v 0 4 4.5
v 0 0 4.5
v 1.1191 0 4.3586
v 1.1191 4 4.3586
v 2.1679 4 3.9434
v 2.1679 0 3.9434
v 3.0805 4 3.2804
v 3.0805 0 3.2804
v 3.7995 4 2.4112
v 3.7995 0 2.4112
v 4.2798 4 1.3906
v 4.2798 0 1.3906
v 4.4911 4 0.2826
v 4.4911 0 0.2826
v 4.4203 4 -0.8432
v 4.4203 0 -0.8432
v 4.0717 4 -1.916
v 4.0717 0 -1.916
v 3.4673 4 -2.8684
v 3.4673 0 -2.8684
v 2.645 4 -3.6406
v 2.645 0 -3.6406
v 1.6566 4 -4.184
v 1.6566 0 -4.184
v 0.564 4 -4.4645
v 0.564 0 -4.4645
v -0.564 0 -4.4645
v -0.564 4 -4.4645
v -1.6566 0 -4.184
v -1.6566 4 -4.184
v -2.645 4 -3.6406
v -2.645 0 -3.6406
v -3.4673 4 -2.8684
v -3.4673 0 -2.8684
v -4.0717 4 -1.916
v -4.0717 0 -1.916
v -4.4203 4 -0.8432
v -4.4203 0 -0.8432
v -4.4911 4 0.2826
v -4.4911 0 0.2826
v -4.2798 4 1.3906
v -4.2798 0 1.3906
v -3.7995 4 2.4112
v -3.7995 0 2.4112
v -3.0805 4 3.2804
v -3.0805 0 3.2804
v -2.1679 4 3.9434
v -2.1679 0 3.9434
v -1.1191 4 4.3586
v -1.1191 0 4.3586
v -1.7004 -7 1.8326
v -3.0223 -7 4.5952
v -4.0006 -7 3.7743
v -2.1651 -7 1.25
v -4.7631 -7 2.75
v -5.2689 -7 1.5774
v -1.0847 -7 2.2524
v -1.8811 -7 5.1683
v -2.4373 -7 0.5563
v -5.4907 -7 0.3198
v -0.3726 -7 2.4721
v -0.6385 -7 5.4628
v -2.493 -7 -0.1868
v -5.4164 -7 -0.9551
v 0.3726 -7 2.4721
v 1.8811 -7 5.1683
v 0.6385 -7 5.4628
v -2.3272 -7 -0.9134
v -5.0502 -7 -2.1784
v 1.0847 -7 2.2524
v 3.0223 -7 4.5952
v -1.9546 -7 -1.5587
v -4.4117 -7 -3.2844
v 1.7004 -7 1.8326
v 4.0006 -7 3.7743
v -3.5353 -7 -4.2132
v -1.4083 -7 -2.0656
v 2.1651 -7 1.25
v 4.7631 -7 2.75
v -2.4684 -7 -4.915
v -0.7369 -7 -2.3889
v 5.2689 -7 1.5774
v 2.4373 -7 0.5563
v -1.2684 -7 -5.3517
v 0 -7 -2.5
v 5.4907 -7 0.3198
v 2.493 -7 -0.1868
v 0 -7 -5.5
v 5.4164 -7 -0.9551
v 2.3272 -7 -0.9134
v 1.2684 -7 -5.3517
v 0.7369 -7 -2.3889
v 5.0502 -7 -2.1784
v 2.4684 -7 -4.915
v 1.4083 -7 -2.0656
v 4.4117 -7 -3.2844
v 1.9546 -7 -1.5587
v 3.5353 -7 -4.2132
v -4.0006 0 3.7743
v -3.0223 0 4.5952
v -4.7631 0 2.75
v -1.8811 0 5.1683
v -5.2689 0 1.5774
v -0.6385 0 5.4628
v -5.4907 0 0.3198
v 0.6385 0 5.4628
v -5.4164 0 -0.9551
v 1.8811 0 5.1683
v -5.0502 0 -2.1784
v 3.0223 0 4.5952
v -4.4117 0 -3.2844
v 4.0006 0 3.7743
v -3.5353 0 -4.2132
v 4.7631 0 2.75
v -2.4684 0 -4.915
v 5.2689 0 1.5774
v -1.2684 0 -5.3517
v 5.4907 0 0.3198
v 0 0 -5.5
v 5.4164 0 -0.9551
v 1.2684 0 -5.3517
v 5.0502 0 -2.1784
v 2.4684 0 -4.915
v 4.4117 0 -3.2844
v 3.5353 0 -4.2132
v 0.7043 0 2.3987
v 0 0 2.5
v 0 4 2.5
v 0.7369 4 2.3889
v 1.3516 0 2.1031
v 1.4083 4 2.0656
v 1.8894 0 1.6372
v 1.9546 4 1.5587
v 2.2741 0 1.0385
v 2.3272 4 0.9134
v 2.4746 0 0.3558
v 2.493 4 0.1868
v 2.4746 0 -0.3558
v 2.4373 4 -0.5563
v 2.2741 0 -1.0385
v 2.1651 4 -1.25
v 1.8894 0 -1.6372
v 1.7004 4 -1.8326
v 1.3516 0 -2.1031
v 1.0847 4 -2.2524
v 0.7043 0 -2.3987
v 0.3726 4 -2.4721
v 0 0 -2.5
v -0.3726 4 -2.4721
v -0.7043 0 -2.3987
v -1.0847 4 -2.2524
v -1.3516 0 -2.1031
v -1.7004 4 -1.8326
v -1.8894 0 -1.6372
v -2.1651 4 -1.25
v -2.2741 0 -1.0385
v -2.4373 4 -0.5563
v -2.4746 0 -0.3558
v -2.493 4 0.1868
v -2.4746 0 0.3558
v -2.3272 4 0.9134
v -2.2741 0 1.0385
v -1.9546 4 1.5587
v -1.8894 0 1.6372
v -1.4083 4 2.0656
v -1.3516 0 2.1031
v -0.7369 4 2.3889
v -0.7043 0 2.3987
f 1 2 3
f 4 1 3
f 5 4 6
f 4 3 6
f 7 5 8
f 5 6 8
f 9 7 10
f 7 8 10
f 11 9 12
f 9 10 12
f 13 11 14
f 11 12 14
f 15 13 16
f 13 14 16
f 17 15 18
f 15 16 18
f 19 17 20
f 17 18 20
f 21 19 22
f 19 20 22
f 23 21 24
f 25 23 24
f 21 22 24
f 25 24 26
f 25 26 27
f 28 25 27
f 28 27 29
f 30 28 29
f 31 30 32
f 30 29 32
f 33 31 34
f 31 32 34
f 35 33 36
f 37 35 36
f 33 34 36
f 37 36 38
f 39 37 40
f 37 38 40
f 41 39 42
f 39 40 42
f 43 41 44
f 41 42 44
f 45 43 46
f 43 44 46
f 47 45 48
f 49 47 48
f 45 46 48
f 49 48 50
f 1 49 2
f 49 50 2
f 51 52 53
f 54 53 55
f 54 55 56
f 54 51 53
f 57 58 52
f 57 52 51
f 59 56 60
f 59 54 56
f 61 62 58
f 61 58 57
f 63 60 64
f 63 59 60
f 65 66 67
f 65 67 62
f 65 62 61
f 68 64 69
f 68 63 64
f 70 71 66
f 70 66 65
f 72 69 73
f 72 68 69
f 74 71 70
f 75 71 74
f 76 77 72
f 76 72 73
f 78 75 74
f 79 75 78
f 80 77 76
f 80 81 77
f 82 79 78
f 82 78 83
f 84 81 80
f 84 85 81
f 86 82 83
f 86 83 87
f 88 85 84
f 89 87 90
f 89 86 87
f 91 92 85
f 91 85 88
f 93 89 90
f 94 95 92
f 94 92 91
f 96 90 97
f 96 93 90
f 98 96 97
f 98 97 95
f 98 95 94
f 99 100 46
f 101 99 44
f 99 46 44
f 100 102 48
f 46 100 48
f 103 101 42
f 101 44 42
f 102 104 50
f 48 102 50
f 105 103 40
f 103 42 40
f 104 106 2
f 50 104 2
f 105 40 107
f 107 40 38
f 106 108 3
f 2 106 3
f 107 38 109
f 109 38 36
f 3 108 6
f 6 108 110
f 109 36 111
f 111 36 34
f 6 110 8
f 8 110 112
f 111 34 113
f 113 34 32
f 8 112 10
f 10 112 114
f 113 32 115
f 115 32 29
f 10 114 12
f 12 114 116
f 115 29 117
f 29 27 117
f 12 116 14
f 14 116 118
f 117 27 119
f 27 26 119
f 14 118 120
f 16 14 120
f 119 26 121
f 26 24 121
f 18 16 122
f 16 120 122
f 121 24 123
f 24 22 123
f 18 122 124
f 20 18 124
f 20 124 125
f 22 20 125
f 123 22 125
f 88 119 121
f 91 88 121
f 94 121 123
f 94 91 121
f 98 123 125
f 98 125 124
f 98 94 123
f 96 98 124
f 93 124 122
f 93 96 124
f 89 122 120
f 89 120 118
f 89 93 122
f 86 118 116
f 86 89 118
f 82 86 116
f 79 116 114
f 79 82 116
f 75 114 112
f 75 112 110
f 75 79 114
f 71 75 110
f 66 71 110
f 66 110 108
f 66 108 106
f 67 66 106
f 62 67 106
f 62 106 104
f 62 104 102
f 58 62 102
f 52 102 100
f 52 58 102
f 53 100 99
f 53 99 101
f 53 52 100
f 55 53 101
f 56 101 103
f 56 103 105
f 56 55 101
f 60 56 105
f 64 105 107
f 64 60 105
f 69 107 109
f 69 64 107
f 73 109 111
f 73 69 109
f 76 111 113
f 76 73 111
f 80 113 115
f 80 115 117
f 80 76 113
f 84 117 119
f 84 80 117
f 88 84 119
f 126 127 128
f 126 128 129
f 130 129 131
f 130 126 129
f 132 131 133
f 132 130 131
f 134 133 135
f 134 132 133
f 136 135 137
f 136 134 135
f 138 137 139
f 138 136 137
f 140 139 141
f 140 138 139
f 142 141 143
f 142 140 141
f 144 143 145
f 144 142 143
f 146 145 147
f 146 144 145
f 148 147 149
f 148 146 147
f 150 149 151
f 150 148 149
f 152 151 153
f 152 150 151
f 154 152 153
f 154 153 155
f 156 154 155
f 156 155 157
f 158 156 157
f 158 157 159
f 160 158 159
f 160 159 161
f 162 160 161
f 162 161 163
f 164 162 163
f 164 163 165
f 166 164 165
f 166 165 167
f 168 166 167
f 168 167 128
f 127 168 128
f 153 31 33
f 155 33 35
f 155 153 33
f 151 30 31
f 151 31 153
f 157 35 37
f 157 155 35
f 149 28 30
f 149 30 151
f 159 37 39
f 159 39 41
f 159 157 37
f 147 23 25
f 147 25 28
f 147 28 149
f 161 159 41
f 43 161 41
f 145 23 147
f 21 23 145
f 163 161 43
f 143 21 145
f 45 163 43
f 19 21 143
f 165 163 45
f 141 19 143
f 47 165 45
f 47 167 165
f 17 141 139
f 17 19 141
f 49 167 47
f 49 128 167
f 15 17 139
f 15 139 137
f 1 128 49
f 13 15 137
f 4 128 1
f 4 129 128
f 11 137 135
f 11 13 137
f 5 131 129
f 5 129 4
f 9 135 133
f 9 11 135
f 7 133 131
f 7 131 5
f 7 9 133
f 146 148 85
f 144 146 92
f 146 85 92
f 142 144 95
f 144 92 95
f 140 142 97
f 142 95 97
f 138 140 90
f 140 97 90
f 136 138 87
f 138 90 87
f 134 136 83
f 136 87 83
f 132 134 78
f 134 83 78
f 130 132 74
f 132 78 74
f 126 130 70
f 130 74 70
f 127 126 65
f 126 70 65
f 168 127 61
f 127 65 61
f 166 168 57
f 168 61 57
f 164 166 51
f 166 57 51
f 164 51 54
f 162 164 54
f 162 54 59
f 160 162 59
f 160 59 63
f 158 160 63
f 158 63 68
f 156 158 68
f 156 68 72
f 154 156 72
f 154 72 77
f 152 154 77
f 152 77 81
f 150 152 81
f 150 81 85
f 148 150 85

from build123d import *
from build123d.topology import SkipClean

# Parameters (mm, degrees)
SKETCH1_R           = 4.5
SKETCH1_R_2         = 2.5
BOSS_EXTRUDE1_DEPTH = 4
BOSS_EXTRUDE2_START = 7
SKETCH2_R           = 5.5
SKETCH2_R_2         = 2.5
BOSS_EXTRUDE2_DEPTH = 7


with BuildPart() as part:
    # Sketch1 → Boss-Extrude1 (new body)
    with BuildSketch(Plane(origin=(0, 0, 0), x_dir=(1, 0, 0), z_dir=(0, 1, 0))):
        with Locations(Location((0, 0, 0), (0, 0, 270))):
            Circle(SKETCH1_R)
        with Locations(Location((0, 0, 0), (0, 0, 270))):
            Circle(SKETCH1_R_2, mode=Mode.SUBTRACT)
    extrude(amount=BOSS_EXTRUDE1_DEPTH)

    # Sketch2 → Boss-Extrude2 (add)
    with SkipClean():  # the faces are left unmerged after this step: merging them gives an invalid solid
        with BuildSketch(Plane.XZ.offset(BOSS_EXTRUDE2_START)):
            with Locations(Location((0, 0, 0), (0, 0, 270))):
                Circle(SKETCH2_R)
            with Locations(Location((0, 0, 0), (0, 0, 270))):
                Circle(SKETCH2_R_2, mode=Mode.SUBTRACT)
        extrude(amount=-BOSS_EXTRUDE2_DEPTH)


solid = part.part
